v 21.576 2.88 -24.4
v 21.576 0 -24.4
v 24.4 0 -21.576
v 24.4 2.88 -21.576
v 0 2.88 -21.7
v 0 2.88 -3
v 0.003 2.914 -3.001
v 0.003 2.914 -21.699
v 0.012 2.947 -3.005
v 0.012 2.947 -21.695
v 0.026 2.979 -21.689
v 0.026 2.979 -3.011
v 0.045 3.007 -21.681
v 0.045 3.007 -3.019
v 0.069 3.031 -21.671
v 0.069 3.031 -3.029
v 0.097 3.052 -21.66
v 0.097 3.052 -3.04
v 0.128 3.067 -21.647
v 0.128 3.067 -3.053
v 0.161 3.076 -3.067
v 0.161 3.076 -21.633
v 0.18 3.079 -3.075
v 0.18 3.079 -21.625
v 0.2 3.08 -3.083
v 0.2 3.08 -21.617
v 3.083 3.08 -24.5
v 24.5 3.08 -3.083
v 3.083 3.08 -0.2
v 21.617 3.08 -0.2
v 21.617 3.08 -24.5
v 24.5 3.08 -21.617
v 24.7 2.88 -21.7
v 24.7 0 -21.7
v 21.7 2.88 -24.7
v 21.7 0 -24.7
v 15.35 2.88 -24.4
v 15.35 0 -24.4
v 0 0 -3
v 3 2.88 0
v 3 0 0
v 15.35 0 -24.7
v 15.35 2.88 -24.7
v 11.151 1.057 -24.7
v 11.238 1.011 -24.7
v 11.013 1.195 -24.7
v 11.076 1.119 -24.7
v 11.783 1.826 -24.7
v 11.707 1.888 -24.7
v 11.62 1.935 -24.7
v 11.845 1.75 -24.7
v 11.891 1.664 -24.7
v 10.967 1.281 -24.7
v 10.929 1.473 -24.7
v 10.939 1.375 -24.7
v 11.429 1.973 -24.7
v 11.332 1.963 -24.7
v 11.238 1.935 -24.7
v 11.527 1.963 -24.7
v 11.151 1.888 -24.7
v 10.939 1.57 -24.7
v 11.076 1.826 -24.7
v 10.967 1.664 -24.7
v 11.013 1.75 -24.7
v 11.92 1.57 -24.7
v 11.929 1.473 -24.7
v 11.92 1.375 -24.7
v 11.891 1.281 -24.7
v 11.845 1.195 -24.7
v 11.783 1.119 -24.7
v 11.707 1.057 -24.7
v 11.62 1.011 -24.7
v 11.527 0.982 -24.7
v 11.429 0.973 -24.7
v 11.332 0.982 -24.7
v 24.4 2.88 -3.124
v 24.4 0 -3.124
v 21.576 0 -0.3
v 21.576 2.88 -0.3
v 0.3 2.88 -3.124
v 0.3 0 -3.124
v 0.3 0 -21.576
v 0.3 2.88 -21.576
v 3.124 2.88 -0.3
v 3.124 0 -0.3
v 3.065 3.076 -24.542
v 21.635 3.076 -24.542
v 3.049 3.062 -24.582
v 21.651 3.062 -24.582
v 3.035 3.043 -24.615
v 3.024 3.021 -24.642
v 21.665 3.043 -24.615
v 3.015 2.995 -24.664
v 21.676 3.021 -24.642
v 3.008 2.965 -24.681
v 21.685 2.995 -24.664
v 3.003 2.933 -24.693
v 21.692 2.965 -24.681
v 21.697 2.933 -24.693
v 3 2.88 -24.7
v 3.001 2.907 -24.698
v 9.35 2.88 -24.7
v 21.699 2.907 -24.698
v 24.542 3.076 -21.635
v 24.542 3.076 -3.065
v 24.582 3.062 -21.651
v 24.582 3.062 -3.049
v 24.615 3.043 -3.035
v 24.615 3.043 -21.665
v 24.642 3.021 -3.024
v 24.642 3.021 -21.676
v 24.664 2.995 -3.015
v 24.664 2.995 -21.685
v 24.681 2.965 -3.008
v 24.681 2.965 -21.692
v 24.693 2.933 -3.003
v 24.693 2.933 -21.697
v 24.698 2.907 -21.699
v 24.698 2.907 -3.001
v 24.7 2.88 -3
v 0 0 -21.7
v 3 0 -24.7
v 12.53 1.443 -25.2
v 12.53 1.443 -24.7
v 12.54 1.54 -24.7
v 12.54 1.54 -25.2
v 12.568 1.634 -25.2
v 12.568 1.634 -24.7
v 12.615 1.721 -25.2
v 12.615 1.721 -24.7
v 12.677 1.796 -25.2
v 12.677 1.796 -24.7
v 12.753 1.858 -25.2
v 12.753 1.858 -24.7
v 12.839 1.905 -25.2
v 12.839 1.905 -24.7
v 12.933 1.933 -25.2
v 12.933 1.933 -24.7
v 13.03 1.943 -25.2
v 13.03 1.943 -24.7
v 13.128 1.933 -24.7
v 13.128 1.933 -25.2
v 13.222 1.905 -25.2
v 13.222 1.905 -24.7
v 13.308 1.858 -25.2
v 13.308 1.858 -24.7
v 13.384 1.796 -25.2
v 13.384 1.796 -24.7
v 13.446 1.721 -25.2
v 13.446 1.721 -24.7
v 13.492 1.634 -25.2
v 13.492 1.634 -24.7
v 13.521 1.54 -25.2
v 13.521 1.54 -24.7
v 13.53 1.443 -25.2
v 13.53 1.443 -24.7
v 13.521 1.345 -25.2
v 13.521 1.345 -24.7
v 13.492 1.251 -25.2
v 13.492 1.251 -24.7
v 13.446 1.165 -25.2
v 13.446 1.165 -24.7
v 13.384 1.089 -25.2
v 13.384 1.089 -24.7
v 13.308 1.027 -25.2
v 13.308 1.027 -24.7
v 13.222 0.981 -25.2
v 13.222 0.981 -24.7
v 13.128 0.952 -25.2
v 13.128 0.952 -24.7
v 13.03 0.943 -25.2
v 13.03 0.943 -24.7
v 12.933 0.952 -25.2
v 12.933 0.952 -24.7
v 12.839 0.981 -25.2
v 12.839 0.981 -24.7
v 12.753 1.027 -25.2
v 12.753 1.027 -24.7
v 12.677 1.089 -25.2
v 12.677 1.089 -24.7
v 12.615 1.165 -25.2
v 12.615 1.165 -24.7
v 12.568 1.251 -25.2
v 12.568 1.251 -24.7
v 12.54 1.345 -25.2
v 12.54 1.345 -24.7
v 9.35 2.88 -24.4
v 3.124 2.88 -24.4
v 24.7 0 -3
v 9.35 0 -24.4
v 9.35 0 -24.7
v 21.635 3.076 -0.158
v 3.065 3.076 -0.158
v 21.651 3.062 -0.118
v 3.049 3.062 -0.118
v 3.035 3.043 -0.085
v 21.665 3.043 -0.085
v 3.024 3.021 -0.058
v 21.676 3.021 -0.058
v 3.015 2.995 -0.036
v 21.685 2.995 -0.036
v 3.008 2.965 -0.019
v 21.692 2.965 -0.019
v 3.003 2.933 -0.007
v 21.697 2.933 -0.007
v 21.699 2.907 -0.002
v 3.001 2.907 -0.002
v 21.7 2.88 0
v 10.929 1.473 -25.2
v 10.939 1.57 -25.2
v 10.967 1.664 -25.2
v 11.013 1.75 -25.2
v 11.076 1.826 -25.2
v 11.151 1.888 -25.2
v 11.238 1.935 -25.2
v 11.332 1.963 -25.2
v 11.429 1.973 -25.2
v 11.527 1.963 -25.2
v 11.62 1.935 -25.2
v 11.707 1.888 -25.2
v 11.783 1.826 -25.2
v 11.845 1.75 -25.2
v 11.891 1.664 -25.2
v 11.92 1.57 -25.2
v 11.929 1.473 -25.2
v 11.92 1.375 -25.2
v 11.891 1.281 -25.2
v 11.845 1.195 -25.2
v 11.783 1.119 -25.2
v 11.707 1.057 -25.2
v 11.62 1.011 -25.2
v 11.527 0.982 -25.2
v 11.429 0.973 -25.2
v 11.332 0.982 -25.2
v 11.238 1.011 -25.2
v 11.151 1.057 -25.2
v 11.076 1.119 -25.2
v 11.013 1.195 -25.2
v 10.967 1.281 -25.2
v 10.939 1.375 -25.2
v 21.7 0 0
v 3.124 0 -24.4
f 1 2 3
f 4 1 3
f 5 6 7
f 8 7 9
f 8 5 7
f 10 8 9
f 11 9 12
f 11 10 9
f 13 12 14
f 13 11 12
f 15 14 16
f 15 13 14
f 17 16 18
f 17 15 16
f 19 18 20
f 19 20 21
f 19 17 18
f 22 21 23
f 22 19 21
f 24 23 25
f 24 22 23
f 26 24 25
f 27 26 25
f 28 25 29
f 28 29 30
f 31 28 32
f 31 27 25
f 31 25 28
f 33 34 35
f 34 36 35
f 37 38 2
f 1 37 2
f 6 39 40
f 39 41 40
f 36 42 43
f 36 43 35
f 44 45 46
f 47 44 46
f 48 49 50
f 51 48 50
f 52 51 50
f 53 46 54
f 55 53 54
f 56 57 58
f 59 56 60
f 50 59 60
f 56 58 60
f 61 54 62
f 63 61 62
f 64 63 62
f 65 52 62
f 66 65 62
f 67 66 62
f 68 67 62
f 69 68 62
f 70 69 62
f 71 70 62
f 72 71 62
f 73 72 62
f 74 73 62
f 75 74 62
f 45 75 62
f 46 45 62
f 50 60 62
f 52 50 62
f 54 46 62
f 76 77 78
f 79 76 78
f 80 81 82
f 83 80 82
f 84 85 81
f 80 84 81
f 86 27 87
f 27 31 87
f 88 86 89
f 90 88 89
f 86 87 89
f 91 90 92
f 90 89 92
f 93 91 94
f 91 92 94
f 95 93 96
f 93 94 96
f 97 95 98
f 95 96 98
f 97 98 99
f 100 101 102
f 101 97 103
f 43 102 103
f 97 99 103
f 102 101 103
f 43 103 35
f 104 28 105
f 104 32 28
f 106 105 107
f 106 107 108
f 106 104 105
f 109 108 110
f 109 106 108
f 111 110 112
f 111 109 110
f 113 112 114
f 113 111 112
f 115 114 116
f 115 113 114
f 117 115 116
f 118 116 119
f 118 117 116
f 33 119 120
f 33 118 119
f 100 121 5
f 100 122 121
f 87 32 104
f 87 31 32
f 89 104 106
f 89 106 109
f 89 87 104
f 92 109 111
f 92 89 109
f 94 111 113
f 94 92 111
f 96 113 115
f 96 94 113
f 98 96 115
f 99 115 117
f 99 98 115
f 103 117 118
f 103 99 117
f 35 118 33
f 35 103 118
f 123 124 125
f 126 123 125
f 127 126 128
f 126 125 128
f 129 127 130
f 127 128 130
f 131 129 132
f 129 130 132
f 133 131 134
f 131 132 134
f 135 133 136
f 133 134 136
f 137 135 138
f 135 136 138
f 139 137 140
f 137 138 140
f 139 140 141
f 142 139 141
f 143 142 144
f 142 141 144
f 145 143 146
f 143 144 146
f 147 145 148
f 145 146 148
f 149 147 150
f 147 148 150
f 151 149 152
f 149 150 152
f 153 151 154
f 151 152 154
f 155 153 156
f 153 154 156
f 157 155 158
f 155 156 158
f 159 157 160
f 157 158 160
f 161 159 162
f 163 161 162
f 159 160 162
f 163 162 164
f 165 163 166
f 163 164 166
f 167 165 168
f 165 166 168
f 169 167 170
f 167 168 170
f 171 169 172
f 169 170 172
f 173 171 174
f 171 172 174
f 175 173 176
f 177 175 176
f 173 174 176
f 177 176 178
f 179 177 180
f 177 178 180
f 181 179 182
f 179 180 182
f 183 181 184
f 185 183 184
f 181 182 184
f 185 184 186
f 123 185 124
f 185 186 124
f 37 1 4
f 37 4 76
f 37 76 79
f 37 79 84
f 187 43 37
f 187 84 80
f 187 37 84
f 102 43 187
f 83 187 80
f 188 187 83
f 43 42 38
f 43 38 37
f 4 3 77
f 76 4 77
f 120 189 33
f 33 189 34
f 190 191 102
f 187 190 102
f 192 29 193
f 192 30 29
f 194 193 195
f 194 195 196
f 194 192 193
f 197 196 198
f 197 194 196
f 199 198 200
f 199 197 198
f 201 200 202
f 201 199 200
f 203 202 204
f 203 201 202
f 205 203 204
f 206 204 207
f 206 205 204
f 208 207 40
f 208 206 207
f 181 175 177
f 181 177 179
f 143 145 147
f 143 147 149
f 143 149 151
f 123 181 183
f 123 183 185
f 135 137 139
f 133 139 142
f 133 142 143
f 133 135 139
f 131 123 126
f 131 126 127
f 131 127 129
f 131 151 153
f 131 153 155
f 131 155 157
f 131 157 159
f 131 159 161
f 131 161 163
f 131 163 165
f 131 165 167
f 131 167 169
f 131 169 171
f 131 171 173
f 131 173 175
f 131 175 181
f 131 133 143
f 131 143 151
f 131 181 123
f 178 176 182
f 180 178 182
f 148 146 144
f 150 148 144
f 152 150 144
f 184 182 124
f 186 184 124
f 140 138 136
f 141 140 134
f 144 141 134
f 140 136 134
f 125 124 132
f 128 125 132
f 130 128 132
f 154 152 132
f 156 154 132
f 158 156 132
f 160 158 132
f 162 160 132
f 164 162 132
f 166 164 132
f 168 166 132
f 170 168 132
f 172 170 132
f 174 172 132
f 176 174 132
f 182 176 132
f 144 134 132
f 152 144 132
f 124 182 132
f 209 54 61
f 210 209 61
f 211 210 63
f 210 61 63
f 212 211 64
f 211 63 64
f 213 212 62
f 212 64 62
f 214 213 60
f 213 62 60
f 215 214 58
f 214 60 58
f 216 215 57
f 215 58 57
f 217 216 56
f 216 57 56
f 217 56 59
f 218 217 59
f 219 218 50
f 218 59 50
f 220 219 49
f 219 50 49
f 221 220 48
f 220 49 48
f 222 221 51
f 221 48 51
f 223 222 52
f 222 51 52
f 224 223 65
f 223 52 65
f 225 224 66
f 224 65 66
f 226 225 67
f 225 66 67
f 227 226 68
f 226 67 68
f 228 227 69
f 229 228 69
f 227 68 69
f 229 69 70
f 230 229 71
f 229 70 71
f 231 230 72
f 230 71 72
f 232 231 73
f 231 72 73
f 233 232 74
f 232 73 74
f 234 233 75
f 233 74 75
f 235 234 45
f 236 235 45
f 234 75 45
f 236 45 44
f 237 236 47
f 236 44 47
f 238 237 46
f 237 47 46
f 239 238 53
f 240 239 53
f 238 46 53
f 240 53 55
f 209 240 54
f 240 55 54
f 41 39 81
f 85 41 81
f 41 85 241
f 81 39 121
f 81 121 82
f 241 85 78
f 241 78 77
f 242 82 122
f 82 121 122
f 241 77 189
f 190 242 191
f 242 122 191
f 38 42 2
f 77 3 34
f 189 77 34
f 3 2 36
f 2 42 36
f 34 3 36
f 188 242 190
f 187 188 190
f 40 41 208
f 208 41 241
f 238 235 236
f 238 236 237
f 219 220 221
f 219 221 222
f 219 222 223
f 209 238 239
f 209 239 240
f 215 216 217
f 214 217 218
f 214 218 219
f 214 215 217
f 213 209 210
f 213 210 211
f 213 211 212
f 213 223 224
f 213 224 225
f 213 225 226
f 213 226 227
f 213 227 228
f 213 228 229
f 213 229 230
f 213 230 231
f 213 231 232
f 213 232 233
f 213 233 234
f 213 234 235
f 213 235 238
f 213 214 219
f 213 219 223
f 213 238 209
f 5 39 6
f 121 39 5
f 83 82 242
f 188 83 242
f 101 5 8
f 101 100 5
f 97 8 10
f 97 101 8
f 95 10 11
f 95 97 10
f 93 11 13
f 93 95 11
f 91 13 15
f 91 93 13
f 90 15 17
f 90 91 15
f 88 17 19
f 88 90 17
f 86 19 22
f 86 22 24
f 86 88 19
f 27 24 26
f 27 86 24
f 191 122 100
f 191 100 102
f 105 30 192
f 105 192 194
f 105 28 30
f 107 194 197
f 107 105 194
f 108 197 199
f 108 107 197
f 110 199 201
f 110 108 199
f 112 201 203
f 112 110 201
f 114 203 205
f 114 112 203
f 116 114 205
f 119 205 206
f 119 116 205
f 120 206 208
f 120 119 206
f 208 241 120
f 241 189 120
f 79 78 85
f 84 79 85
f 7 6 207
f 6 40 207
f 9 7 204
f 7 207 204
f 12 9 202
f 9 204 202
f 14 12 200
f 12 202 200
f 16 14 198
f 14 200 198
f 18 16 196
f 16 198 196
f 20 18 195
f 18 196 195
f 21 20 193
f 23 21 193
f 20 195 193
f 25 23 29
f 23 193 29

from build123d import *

# Parameters (mm, degrees)
ESQUISSE1_W             = 24.7
ESQUISSE1_H             = 24.7
BOSS_EXTRU_1_DEPTH      = 3.08
CHANFREIN1_SIZE         = 3
CONG_1_R                = 0.2
ESQUISSE2_W             = 6
ESQUISSE2_H             = 2.88
ENL_V_MAT_EXTRU_1_DEPTH = 22.08
ENL_V_MAT_EXTRU_2_DEPTH = 2.88
SKETCH1_R               = 0.5
BOSS_EXTRUDE1_DEPTH     = 0.5
BOSS_EXTRUDE1_2_DEPTH   = 0.5


with BuildPart() as part:
    # Esquisse1 → Boss.-Extru.1 (new body)
    with BuildSketch(Plane(origin=(0, 0, 0), x_dir=(1, 0, 0), z_dir=(0, 1, 0))):
        with Locations((12.35, 12.35)):
            Rectangle(ESQUISSE1_W, ESQUISSE1_H)
    extrude(amount=BOSS_EXTRU_1_DEPTH)

    # Chanfrein1
    chanfrein1_edges = [part.edges().sort_by_distance(p)[0] for p in [
        (0, 1.54, -24.7),
        (24.7, 1.54, -24.7),
        (24.7, 1.54, 0),
        (0, 1.54, 0),
    ]]
    chamfer(chanfrein1_edges, length=CHANFREIN1_SIZE)

    # Congé1
    cong_1_edges = [part.edges().sort_by_distance(p)[0] for p in [
        (0, 3.08, -12.35),
        (12.35, 3.08, -24.7),
        (12.35, 3.08, 0),
        (24.7, 3.08, -12.35),
        (1.5, 3.08, -1.5),
        (23.2, 3.08, -1.5),
        (23.2, 3.08, -23.2),
        (1.5, 3.08, -23.2),
    ]]
    fillet(cong_1_edges, radius=CONG_1_R)

    # Esquisse2 → Enlèv. mat.-Extru.1 (cut)
    with BuildSketch(Plane(origin=(0, 0, -24.7), x_dir=(-1, 0, 0), z_dir=(0, 0, -1))):
        with Locations((-12.35, 1.44)):
            Rectangle(ESQUISSE2_W, ESQUISSE2_H)
    extrude(amount=-ENL_V_MAT_EXTRU_1_DEPTH, mode=Mode.SUBTRACT)

    # Esquisse3 → Enlèv. mat.-Extru.2 (cut)
    with BuildSketch(Plane.XZ):
        Polygon((3.124264069, -24.4), (21.575735931, -24.4), (24.4, -21.575735931), (24.4, -3.124264069), (21.575735931, -0.3), (3.124264069, -0.3), (0.3, -3.124264069), (0.3, -21.575735931), align=None)
    extrude(amount=-ENL_V_MAT_EXTRU_2_DEPTH, mode=Mode.SUBTRACT)


with BuildPart() as body_2:
    # Sketch1 → Boss-Extrude1 (new body)
    with BuildSketch(Plane(origin=(0, 0, -24.7), x_dir=(-1, 0, 0), z_dir=(0, 0, -1))):
        with Locations((-11.42912296, 1.472678578)):
            Circle(SKETCH1_R)
    extrude(amount=BOSS_EXTRUDE1_DEPTH)


with BuildPart() as body_3:
    # Sketch1 → Boss-Extrude1 2 (new body)
    with BuildSketch(Plane(origin=(0, 0, -24.7), x_dir=(-1, 0, 0), z_dir=(0, 0, -1))):
        with Locations((-13.030297456, 1.442750083)):
            Circle(SKETCH1_R)
    extrude(amount=BOSS_EXTRUDE1_2_DEPTH)


solid = Compound([part.part, body_2.part, body_3.part])
